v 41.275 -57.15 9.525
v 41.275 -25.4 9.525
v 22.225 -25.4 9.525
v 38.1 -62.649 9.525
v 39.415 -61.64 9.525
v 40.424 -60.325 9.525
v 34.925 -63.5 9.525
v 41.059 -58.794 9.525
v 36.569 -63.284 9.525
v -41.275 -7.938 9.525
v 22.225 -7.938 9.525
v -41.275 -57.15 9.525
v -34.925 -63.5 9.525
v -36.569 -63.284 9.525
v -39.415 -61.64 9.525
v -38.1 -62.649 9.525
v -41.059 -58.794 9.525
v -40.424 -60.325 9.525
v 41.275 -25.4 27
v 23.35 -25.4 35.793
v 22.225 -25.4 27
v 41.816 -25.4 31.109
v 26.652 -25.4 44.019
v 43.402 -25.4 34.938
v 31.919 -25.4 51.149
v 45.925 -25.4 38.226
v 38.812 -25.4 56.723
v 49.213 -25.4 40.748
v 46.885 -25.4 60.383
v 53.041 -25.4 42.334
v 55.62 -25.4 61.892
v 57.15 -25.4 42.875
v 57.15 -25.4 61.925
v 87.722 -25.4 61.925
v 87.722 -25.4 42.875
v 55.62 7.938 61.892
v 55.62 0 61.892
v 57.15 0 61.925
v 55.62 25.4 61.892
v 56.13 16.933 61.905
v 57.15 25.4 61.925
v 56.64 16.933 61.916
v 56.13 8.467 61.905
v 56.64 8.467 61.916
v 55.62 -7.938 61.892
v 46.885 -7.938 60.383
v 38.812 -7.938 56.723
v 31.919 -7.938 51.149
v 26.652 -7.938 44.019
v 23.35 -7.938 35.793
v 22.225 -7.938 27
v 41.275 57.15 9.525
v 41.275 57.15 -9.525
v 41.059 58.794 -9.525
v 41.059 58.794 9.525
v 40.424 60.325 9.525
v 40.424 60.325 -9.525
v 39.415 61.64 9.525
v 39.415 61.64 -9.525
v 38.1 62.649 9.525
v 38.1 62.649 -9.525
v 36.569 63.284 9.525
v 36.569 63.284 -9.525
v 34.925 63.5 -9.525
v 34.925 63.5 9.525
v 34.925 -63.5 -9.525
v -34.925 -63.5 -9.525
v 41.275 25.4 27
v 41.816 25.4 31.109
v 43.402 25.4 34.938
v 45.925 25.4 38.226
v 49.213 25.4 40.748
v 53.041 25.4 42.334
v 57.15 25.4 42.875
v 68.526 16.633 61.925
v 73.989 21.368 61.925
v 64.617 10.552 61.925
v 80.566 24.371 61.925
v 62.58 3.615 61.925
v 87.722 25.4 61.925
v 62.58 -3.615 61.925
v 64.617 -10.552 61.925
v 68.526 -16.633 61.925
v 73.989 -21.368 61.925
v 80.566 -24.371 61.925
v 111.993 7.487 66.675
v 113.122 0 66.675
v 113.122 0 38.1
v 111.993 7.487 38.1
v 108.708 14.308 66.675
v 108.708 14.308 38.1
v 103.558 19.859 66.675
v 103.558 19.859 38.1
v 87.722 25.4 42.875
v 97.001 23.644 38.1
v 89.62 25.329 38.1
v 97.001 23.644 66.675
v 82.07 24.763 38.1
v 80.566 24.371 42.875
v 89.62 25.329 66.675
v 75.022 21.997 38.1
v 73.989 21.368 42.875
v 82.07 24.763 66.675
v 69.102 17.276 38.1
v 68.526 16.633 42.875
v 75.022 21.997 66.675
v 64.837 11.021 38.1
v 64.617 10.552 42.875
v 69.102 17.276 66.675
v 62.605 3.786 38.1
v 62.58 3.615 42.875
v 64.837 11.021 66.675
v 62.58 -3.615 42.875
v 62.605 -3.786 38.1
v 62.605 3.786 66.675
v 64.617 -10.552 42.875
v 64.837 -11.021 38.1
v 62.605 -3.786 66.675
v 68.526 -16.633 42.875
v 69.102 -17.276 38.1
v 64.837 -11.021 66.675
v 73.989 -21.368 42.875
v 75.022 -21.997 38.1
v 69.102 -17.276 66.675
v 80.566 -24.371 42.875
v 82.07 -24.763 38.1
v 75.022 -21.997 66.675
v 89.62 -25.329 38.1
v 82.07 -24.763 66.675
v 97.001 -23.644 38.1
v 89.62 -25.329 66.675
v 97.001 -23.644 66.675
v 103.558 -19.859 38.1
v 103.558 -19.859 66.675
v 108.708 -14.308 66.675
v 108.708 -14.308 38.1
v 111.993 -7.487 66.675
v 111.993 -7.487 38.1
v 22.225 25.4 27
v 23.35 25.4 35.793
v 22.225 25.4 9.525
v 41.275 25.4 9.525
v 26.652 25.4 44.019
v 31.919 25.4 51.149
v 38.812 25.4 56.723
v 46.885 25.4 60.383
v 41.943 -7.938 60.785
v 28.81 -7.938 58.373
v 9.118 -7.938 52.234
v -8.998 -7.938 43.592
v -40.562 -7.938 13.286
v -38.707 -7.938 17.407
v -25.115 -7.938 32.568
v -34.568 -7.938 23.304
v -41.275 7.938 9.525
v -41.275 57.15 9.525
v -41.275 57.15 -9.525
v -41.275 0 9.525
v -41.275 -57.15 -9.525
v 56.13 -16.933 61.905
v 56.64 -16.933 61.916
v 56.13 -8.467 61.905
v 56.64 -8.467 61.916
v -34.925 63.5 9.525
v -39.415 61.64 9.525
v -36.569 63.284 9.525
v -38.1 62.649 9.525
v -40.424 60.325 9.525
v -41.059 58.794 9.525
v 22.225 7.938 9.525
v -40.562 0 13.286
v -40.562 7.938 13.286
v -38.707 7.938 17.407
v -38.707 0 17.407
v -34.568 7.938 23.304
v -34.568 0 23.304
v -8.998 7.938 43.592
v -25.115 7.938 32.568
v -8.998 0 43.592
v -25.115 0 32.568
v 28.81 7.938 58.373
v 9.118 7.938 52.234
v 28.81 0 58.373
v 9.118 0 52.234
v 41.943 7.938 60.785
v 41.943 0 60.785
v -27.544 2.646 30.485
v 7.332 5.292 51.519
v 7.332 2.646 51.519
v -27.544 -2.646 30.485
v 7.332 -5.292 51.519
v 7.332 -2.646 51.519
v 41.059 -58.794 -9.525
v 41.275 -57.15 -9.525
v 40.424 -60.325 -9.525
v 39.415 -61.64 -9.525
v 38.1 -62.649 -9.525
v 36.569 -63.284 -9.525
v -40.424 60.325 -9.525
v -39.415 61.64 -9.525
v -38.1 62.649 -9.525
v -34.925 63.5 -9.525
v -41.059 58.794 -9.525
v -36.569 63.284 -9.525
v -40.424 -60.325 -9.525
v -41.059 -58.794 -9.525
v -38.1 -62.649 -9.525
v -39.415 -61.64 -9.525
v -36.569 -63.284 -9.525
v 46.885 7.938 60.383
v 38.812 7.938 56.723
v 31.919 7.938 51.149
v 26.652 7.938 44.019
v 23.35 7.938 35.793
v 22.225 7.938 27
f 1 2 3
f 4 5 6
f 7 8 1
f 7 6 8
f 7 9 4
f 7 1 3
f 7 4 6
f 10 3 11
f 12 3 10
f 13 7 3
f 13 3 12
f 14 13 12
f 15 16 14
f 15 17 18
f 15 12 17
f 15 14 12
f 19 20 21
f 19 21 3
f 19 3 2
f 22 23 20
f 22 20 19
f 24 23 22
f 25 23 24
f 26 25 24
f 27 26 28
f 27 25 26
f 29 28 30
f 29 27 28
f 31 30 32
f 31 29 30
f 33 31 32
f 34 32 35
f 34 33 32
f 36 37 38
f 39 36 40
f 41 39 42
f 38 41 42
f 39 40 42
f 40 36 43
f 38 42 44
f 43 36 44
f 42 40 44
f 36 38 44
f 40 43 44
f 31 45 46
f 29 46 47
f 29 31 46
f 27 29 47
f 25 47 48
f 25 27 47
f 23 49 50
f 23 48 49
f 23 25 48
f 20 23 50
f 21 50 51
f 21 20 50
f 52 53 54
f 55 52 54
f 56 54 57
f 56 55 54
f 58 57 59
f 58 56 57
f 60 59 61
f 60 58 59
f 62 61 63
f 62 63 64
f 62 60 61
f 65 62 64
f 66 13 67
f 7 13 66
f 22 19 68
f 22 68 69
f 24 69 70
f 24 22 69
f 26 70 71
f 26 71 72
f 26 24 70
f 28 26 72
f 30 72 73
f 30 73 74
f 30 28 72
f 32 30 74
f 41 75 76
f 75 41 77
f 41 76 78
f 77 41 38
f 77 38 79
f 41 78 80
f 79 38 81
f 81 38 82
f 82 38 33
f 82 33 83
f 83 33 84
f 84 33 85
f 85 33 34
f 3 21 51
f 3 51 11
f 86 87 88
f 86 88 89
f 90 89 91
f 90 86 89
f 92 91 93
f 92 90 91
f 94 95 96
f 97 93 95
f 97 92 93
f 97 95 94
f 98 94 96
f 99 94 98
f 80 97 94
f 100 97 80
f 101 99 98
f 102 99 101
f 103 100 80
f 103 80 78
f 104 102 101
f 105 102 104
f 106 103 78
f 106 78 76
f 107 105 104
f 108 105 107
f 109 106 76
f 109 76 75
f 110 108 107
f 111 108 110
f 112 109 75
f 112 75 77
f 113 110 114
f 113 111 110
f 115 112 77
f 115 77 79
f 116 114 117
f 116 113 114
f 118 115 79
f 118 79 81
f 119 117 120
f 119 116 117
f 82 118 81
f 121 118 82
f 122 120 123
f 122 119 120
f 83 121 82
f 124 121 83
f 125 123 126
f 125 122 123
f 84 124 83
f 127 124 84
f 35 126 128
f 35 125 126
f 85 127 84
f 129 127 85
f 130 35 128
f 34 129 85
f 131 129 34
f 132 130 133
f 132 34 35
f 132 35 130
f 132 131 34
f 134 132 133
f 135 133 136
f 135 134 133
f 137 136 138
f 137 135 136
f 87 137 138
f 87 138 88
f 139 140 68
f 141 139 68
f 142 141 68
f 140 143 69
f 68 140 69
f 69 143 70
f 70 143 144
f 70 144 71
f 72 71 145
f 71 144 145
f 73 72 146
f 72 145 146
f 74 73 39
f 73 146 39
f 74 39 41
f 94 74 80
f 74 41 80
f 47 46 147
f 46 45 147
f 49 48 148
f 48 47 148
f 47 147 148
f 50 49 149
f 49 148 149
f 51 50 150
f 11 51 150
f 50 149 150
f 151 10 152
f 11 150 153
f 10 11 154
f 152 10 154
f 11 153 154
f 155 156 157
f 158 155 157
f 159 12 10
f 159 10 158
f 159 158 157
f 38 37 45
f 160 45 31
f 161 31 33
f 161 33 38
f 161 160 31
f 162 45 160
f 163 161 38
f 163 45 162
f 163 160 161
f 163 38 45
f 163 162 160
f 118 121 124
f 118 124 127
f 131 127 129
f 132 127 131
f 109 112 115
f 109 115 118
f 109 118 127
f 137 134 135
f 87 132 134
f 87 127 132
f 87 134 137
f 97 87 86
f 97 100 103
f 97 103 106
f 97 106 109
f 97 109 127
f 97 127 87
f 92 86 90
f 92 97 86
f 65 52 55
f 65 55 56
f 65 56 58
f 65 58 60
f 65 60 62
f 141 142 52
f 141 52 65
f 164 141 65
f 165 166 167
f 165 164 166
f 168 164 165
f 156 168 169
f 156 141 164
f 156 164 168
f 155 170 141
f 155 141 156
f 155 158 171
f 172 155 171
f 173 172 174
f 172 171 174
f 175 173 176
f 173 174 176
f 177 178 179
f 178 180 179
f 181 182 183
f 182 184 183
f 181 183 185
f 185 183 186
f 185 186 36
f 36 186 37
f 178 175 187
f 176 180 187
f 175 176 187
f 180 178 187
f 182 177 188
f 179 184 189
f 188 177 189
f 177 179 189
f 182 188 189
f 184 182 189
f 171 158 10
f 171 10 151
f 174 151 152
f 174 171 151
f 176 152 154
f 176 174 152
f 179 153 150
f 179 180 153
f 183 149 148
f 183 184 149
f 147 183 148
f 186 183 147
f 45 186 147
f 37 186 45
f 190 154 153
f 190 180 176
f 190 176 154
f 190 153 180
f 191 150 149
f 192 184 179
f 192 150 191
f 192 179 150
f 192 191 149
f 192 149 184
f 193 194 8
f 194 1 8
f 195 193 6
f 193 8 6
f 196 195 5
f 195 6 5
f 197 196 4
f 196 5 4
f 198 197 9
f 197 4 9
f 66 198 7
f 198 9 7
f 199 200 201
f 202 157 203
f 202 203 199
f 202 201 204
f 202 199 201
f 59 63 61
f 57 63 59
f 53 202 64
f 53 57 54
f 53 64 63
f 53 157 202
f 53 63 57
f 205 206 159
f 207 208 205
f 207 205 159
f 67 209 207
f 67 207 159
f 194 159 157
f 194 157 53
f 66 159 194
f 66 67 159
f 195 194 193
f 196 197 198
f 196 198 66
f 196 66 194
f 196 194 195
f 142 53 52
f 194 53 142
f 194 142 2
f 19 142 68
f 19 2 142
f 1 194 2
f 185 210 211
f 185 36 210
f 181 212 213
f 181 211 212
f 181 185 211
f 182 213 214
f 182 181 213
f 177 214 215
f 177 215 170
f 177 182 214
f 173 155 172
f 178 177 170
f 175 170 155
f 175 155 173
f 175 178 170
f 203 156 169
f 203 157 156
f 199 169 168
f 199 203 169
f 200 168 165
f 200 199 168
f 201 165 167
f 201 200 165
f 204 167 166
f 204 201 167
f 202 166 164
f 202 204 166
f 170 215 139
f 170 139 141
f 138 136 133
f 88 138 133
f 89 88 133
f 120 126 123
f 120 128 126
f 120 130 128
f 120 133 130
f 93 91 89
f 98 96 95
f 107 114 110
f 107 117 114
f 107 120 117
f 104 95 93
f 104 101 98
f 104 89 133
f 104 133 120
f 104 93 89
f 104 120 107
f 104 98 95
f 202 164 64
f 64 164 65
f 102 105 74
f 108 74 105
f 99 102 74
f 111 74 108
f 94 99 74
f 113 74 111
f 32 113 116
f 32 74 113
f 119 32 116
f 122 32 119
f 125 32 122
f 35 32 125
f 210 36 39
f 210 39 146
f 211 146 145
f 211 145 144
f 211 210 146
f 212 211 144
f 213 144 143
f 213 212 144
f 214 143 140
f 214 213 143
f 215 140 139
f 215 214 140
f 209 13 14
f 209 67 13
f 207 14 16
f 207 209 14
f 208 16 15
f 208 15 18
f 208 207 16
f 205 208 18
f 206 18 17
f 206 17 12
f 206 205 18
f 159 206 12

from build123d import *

# Parameters (mm, degrees)
F1_DEPTH = 63.5
F2_DEPTH = 25.4
F3_DEPTH = 7.9375
F0_W     = 25.4
F0_H     = 19.05
F4_DEPTH = 25.4
F6_R     = 6.35


with BuildPart() as f1:
    # F0 (on Front) → F1 (new body, symmetric)
    with BuildSketch(Plane.XZ):
        Polygon((-41.275, 9.525), (-41.275, -9.525), (41.275, -9.525), (41.275, 9.525), (22.225, 9.525), align=None)
    extrude(amount=F1_DEPTH, both=True)

    # F0 (on Front) → F2 (join, symmetric)
    with BuildSketch(Plane.XZ):
        with BuildLine():
            Line((22.225, 9.525), (41.275, 9.525))
            Line((41.275, 9.525), (41.275, 27.0002))
            ThreePointArc((41.275, 27.0002), (45.9246798487, 38.2255201513), (57.15, 42.8752))
            Line((57.15, 42.8752), (62.3217315116, 42.8752))
            Line((62.3217315116, 42.8752), (62.3217315116, 61.9252))
            Line((62.3217315116, 61.9252), (57.15, 61.9252))
            add(Edge.make_bspline(
                [(55.6203273588, 61.8916850158), (56.1294251185, 61.9058990464), (56.639326625, 61.9170854616), (57.15, 61.9252)],
                knots=[110.4319750844, 110.4319750844, 110.4319750844, 110.4319750844, 111.5045361635, 111.5045361635, 111.5045361635, 111.5045361635], degree=3))
            ThreePointArc((55.6203273588, 61.8916850158), (31.9192703039, 51.1490282118), (22.225, 27.0002))
            Line((22.225, 27.0002), (22.225, 9.525))
        make_face()
    extrude(amount=F2_DEPTH, both=True)

    # F0 (on Front) → F3 (join, symmetric)
    with BuildSketch(Plane.XZ):
        with BuildLine():
            add(Edge.make_bspline(
                [(-41.275, 9.525), (-40.6936184634, 26.8690425338), (3.2031063652, 60.4281940287), (55.6203273588, 61.8916850158)],
                knots=[0, 0, 0, 0, 110.4319750844, 110.4319750844, 110.4319750844, 110.4319750844], degree=3))
            Line((-41.275, 9.525), (22.225, 9.525))
            Line((22.225, 9.525), (22.225, 27.0002))
            ThreePointArc((22.225, 27.0002), (31.9192703039, 51.1490282118), (55.6203273588, 61.8916850158))
        make_face()
    extrude(amount=F3_DEPTH, both=True)

    # F0 (on Front) → F4 (join, symmetric)
    with BuildSketch(Plane.XZ):
        with Locations((75.0217315116, 52.4002)):
            Rectangle(F0_W, F0_H)
    extrude(amount=F4_DEPTH, both=True)

    # F0 (on Front) → F5 (revolve)
    with BuildSketch(Plane.XZ):
        Polygon((87.7217315116, 66.675), (87.7217315116, 61.9252), (87.7217315116, 42.8752), (87.7217315116, 38.1), (113.1217315116, 38.1), (113.1217315116, 66.675), align=None)
    revolve(axis=Axis((87.7217315116, 0, 52.3875), (0, 0, 1)))

    # F6
    f6_edges = [f1.edges().sort_by_distance(p)[0] for p in [
        (41.275, 63.5, 0),
        (-41.275, 63.5, 0),
        (-41.275, -63.5, 0),
        (41.275, -63.5, 0),
    ]]
    fillet(f6_edges, radius=F6_R)


solid = f1.part
